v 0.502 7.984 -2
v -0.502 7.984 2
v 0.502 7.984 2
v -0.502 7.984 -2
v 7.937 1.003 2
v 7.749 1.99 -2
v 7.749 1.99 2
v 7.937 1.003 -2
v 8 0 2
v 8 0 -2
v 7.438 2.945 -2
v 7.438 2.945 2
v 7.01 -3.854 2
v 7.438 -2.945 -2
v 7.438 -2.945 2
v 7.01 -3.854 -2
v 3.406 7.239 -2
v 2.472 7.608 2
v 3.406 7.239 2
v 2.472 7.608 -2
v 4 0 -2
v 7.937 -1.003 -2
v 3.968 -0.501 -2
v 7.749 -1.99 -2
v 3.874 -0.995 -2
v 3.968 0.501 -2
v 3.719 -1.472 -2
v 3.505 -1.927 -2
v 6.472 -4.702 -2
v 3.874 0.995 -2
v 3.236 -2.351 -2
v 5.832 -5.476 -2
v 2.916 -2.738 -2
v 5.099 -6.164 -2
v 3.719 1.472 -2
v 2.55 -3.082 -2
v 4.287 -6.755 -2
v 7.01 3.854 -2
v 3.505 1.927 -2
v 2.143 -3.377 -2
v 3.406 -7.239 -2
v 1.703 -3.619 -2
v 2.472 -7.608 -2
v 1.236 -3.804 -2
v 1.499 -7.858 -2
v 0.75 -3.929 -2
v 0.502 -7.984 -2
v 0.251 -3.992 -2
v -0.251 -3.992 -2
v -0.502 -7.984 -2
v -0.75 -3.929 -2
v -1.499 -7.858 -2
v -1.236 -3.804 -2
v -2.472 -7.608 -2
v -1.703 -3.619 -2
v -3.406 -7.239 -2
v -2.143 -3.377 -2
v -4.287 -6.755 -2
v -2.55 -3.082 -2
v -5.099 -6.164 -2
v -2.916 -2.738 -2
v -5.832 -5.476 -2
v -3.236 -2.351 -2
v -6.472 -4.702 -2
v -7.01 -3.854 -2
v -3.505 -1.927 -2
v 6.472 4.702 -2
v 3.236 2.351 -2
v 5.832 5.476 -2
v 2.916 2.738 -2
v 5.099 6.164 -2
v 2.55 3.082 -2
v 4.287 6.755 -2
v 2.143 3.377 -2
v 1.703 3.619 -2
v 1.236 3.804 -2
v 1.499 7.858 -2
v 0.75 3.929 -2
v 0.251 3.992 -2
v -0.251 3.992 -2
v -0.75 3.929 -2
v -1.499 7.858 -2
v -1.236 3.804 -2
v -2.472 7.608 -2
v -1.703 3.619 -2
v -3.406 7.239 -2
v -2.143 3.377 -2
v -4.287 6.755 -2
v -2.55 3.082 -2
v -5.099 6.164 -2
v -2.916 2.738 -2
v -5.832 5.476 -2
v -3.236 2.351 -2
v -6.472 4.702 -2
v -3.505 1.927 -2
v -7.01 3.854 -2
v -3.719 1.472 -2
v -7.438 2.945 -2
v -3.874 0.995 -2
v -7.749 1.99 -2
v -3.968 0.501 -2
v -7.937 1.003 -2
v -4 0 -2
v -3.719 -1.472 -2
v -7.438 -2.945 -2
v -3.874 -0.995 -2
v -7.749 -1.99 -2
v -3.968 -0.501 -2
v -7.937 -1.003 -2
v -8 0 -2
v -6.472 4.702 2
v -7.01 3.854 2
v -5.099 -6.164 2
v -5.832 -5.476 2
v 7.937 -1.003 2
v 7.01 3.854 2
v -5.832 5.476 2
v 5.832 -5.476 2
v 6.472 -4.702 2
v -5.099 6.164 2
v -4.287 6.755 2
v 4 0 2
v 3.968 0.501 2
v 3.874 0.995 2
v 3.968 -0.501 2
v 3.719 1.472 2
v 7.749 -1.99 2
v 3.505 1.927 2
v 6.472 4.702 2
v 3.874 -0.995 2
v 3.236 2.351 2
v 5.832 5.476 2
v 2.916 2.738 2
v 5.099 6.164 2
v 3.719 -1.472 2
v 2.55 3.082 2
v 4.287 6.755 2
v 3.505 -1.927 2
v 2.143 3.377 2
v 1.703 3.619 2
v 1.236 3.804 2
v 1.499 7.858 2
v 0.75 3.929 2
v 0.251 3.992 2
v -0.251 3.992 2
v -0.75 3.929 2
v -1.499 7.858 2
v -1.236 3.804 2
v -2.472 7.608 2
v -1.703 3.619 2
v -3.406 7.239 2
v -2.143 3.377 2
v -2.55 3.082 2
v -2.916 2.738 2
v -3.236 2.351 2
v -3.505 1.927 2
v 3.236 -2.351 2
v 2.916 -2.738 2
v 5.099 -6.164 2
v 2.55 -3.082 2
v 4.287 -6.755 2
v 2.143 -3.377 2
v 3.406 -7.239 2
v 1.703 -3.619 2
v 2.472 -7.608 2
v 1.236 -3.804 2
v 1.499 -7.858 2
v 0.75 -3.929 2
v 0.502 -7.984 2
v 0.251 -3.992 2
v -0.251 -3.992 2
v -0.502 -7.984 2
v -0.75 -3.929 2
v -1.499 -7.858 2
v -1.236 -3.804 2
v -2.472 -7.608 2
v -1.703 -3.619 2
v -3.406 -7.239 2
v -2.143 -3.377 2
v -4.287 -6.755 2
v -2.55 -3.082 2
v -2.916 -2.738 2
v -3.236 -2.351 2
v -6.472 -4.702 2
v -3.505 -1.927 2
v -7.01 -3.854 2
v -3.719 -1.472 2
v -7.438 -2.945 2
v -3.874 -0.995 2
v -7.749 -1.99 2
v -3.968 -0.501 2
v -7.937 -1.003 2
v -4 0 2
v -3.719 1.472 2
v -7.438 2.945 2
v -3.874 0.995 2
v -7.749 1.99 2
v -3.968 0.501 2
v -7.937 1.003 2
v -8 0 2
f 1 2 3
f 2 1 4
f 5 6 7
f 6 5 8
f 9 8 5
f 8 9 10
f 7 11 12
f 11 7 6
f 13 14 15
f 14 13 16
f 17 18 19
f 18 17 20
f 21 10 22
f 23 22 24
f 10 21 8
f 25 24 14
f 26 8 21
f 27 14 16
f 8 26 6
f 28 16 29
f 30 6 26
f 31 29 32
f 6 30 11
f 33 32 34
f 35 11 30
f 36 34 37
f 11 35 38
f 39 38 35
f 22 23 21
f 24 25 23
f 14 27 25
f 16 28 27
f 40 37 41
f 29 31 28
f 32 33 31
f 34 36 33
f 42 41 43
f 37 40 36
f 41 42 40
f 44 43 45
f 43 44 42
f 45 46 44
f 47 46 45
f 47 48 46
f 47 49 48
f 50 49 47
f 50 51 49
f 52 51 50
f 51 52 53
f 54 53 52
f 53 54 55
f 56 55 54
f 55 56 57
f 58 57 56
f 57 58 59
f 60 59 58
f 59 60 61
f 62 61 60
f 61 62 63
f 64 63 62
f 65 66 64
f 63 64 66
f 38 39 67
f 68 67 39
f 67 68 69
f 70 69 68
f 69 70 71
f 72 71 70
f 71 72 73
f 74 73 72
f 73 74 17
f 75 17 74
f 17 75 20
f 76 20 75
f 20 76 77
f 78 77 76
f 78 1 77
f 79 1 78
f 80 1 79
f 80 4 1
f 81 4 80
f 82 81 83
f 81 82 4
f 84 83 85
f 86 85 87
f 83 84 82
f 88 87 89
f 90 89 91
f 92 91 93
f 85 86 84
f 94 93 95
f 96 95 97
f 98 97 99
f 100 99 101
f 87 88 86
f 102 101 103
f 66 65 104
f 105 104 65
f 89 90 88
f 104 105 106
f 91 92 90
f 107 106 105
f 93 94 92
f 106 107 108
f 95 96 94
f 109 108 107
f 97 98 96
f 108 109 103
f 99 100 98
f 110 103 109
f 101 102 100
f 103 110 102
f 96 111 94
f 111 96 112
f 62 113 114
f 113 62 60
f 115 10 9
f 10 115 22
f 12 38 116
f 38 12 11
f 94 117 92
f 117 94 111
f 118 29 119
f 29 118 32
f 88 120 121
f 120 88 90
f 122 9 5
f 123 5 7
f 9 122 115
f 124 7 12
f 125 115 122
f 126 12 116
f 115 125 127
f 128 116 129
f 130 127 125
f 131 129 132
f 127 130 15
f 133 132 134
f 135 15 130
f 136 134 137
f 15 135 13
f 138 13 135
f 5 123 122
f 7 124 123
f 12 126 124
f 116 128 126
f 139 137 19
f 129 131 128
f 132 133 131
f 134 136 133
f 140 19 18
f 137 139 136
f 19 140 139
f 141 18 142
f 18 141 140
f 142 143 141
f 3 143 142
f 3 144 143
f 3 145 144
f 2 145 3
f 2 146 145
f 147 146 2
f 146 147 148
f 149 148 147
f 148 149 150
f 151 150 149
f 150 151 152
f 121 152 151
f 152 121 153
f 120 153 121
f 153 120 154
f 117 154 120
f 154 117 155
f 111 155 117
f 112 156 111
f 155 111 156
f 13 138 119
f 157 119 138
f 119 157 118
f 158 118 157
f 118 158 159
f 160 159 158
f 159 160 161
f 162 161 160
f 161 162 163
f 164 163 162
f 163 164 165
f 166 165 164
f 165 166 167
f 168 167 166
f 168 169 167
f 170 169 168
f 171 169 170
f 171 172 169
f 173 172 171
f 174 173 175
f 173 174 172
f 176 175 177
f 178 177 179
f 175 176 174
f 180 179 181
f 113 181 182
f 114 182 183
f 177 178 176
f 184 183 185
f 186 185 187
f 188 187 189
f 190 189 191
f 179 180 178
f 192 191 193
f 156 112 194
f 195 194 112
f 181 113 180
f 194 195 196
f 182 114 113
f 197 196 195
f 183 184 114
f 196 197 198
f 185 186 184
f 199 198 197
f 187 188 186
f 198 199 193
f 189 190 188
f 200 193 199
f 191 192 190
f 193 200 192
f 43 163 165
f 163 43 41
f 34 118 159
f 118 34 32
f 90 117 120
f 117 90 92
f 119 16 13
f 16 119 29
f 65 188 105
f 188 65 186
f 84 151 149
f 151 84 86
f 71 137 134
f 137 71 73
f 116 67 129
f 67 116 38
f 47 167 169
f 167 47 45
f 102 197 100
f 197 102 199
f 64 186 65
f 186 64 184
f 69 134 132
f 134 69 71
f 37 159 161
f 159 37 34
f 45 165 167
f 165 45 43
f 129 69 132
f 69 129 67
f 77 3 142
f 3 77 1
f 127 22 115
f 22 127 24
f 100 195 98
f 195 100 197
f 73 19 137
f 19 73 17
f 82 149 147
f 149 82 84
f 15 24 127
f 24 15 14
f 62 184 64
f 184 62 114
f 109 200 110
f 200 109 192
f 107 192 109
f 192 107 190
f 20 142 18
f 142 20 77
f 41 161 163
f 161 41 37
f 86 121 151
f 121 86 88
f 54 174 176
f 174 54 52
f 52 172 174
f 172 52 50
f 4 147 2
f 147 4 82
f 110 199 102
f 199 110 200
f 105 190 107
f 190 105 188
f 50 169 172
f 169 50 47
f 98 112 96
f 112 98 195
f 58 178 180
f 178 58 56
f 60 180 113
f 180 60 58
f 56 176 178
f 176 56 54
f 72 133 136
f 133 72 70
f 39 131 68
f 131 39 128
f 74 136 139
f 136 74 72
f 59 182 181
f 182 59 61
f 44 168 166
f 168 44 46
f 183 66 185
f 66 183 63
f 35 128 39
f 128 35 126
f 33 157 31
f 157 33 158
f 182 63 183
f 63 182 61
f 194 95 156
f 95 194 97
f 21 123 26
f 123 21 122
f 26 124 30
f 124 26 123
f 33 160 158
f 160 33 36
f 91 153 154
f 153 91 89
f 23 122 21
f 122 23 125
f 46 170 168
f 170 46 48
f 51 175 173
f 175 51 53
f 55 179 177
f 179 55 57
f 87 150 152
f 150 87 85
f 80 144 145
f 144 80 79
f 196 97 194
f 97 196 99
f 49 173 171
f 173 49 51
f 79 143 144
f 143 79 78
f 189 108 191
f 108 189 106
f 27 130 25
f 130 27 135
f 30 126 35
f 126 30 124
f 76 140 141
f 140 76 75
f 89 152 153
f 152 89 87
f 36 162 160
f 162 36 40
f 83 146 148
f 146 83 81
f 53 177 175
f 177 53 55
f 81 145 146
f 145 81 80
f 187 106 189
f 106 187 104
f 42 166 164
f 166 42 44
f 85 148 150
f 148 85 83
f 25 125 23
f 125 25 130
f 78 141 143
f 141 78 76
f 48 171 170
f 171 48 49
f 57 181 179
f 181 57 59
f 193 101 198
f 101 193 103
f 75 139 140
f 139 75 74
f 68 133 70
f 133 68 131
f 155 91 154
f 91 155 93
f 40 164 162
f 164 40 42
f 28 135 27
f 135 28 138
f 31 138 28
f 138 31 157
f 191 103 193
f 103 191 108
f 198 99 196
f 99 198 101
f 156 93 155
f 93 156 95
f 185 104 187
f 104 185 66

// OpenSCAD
$fn = 50;


difference() {
	union() {
		translate(v = [0, 0, -2.0000000000]) {
			cylinder(h = 4, r = 8.0000000000);
		}
	}
	union() {
		translate(v = [0, 0, -100.0000000000]) {
			cylinder(h = 200, r = 4.0000000000);
		}
	}
}
